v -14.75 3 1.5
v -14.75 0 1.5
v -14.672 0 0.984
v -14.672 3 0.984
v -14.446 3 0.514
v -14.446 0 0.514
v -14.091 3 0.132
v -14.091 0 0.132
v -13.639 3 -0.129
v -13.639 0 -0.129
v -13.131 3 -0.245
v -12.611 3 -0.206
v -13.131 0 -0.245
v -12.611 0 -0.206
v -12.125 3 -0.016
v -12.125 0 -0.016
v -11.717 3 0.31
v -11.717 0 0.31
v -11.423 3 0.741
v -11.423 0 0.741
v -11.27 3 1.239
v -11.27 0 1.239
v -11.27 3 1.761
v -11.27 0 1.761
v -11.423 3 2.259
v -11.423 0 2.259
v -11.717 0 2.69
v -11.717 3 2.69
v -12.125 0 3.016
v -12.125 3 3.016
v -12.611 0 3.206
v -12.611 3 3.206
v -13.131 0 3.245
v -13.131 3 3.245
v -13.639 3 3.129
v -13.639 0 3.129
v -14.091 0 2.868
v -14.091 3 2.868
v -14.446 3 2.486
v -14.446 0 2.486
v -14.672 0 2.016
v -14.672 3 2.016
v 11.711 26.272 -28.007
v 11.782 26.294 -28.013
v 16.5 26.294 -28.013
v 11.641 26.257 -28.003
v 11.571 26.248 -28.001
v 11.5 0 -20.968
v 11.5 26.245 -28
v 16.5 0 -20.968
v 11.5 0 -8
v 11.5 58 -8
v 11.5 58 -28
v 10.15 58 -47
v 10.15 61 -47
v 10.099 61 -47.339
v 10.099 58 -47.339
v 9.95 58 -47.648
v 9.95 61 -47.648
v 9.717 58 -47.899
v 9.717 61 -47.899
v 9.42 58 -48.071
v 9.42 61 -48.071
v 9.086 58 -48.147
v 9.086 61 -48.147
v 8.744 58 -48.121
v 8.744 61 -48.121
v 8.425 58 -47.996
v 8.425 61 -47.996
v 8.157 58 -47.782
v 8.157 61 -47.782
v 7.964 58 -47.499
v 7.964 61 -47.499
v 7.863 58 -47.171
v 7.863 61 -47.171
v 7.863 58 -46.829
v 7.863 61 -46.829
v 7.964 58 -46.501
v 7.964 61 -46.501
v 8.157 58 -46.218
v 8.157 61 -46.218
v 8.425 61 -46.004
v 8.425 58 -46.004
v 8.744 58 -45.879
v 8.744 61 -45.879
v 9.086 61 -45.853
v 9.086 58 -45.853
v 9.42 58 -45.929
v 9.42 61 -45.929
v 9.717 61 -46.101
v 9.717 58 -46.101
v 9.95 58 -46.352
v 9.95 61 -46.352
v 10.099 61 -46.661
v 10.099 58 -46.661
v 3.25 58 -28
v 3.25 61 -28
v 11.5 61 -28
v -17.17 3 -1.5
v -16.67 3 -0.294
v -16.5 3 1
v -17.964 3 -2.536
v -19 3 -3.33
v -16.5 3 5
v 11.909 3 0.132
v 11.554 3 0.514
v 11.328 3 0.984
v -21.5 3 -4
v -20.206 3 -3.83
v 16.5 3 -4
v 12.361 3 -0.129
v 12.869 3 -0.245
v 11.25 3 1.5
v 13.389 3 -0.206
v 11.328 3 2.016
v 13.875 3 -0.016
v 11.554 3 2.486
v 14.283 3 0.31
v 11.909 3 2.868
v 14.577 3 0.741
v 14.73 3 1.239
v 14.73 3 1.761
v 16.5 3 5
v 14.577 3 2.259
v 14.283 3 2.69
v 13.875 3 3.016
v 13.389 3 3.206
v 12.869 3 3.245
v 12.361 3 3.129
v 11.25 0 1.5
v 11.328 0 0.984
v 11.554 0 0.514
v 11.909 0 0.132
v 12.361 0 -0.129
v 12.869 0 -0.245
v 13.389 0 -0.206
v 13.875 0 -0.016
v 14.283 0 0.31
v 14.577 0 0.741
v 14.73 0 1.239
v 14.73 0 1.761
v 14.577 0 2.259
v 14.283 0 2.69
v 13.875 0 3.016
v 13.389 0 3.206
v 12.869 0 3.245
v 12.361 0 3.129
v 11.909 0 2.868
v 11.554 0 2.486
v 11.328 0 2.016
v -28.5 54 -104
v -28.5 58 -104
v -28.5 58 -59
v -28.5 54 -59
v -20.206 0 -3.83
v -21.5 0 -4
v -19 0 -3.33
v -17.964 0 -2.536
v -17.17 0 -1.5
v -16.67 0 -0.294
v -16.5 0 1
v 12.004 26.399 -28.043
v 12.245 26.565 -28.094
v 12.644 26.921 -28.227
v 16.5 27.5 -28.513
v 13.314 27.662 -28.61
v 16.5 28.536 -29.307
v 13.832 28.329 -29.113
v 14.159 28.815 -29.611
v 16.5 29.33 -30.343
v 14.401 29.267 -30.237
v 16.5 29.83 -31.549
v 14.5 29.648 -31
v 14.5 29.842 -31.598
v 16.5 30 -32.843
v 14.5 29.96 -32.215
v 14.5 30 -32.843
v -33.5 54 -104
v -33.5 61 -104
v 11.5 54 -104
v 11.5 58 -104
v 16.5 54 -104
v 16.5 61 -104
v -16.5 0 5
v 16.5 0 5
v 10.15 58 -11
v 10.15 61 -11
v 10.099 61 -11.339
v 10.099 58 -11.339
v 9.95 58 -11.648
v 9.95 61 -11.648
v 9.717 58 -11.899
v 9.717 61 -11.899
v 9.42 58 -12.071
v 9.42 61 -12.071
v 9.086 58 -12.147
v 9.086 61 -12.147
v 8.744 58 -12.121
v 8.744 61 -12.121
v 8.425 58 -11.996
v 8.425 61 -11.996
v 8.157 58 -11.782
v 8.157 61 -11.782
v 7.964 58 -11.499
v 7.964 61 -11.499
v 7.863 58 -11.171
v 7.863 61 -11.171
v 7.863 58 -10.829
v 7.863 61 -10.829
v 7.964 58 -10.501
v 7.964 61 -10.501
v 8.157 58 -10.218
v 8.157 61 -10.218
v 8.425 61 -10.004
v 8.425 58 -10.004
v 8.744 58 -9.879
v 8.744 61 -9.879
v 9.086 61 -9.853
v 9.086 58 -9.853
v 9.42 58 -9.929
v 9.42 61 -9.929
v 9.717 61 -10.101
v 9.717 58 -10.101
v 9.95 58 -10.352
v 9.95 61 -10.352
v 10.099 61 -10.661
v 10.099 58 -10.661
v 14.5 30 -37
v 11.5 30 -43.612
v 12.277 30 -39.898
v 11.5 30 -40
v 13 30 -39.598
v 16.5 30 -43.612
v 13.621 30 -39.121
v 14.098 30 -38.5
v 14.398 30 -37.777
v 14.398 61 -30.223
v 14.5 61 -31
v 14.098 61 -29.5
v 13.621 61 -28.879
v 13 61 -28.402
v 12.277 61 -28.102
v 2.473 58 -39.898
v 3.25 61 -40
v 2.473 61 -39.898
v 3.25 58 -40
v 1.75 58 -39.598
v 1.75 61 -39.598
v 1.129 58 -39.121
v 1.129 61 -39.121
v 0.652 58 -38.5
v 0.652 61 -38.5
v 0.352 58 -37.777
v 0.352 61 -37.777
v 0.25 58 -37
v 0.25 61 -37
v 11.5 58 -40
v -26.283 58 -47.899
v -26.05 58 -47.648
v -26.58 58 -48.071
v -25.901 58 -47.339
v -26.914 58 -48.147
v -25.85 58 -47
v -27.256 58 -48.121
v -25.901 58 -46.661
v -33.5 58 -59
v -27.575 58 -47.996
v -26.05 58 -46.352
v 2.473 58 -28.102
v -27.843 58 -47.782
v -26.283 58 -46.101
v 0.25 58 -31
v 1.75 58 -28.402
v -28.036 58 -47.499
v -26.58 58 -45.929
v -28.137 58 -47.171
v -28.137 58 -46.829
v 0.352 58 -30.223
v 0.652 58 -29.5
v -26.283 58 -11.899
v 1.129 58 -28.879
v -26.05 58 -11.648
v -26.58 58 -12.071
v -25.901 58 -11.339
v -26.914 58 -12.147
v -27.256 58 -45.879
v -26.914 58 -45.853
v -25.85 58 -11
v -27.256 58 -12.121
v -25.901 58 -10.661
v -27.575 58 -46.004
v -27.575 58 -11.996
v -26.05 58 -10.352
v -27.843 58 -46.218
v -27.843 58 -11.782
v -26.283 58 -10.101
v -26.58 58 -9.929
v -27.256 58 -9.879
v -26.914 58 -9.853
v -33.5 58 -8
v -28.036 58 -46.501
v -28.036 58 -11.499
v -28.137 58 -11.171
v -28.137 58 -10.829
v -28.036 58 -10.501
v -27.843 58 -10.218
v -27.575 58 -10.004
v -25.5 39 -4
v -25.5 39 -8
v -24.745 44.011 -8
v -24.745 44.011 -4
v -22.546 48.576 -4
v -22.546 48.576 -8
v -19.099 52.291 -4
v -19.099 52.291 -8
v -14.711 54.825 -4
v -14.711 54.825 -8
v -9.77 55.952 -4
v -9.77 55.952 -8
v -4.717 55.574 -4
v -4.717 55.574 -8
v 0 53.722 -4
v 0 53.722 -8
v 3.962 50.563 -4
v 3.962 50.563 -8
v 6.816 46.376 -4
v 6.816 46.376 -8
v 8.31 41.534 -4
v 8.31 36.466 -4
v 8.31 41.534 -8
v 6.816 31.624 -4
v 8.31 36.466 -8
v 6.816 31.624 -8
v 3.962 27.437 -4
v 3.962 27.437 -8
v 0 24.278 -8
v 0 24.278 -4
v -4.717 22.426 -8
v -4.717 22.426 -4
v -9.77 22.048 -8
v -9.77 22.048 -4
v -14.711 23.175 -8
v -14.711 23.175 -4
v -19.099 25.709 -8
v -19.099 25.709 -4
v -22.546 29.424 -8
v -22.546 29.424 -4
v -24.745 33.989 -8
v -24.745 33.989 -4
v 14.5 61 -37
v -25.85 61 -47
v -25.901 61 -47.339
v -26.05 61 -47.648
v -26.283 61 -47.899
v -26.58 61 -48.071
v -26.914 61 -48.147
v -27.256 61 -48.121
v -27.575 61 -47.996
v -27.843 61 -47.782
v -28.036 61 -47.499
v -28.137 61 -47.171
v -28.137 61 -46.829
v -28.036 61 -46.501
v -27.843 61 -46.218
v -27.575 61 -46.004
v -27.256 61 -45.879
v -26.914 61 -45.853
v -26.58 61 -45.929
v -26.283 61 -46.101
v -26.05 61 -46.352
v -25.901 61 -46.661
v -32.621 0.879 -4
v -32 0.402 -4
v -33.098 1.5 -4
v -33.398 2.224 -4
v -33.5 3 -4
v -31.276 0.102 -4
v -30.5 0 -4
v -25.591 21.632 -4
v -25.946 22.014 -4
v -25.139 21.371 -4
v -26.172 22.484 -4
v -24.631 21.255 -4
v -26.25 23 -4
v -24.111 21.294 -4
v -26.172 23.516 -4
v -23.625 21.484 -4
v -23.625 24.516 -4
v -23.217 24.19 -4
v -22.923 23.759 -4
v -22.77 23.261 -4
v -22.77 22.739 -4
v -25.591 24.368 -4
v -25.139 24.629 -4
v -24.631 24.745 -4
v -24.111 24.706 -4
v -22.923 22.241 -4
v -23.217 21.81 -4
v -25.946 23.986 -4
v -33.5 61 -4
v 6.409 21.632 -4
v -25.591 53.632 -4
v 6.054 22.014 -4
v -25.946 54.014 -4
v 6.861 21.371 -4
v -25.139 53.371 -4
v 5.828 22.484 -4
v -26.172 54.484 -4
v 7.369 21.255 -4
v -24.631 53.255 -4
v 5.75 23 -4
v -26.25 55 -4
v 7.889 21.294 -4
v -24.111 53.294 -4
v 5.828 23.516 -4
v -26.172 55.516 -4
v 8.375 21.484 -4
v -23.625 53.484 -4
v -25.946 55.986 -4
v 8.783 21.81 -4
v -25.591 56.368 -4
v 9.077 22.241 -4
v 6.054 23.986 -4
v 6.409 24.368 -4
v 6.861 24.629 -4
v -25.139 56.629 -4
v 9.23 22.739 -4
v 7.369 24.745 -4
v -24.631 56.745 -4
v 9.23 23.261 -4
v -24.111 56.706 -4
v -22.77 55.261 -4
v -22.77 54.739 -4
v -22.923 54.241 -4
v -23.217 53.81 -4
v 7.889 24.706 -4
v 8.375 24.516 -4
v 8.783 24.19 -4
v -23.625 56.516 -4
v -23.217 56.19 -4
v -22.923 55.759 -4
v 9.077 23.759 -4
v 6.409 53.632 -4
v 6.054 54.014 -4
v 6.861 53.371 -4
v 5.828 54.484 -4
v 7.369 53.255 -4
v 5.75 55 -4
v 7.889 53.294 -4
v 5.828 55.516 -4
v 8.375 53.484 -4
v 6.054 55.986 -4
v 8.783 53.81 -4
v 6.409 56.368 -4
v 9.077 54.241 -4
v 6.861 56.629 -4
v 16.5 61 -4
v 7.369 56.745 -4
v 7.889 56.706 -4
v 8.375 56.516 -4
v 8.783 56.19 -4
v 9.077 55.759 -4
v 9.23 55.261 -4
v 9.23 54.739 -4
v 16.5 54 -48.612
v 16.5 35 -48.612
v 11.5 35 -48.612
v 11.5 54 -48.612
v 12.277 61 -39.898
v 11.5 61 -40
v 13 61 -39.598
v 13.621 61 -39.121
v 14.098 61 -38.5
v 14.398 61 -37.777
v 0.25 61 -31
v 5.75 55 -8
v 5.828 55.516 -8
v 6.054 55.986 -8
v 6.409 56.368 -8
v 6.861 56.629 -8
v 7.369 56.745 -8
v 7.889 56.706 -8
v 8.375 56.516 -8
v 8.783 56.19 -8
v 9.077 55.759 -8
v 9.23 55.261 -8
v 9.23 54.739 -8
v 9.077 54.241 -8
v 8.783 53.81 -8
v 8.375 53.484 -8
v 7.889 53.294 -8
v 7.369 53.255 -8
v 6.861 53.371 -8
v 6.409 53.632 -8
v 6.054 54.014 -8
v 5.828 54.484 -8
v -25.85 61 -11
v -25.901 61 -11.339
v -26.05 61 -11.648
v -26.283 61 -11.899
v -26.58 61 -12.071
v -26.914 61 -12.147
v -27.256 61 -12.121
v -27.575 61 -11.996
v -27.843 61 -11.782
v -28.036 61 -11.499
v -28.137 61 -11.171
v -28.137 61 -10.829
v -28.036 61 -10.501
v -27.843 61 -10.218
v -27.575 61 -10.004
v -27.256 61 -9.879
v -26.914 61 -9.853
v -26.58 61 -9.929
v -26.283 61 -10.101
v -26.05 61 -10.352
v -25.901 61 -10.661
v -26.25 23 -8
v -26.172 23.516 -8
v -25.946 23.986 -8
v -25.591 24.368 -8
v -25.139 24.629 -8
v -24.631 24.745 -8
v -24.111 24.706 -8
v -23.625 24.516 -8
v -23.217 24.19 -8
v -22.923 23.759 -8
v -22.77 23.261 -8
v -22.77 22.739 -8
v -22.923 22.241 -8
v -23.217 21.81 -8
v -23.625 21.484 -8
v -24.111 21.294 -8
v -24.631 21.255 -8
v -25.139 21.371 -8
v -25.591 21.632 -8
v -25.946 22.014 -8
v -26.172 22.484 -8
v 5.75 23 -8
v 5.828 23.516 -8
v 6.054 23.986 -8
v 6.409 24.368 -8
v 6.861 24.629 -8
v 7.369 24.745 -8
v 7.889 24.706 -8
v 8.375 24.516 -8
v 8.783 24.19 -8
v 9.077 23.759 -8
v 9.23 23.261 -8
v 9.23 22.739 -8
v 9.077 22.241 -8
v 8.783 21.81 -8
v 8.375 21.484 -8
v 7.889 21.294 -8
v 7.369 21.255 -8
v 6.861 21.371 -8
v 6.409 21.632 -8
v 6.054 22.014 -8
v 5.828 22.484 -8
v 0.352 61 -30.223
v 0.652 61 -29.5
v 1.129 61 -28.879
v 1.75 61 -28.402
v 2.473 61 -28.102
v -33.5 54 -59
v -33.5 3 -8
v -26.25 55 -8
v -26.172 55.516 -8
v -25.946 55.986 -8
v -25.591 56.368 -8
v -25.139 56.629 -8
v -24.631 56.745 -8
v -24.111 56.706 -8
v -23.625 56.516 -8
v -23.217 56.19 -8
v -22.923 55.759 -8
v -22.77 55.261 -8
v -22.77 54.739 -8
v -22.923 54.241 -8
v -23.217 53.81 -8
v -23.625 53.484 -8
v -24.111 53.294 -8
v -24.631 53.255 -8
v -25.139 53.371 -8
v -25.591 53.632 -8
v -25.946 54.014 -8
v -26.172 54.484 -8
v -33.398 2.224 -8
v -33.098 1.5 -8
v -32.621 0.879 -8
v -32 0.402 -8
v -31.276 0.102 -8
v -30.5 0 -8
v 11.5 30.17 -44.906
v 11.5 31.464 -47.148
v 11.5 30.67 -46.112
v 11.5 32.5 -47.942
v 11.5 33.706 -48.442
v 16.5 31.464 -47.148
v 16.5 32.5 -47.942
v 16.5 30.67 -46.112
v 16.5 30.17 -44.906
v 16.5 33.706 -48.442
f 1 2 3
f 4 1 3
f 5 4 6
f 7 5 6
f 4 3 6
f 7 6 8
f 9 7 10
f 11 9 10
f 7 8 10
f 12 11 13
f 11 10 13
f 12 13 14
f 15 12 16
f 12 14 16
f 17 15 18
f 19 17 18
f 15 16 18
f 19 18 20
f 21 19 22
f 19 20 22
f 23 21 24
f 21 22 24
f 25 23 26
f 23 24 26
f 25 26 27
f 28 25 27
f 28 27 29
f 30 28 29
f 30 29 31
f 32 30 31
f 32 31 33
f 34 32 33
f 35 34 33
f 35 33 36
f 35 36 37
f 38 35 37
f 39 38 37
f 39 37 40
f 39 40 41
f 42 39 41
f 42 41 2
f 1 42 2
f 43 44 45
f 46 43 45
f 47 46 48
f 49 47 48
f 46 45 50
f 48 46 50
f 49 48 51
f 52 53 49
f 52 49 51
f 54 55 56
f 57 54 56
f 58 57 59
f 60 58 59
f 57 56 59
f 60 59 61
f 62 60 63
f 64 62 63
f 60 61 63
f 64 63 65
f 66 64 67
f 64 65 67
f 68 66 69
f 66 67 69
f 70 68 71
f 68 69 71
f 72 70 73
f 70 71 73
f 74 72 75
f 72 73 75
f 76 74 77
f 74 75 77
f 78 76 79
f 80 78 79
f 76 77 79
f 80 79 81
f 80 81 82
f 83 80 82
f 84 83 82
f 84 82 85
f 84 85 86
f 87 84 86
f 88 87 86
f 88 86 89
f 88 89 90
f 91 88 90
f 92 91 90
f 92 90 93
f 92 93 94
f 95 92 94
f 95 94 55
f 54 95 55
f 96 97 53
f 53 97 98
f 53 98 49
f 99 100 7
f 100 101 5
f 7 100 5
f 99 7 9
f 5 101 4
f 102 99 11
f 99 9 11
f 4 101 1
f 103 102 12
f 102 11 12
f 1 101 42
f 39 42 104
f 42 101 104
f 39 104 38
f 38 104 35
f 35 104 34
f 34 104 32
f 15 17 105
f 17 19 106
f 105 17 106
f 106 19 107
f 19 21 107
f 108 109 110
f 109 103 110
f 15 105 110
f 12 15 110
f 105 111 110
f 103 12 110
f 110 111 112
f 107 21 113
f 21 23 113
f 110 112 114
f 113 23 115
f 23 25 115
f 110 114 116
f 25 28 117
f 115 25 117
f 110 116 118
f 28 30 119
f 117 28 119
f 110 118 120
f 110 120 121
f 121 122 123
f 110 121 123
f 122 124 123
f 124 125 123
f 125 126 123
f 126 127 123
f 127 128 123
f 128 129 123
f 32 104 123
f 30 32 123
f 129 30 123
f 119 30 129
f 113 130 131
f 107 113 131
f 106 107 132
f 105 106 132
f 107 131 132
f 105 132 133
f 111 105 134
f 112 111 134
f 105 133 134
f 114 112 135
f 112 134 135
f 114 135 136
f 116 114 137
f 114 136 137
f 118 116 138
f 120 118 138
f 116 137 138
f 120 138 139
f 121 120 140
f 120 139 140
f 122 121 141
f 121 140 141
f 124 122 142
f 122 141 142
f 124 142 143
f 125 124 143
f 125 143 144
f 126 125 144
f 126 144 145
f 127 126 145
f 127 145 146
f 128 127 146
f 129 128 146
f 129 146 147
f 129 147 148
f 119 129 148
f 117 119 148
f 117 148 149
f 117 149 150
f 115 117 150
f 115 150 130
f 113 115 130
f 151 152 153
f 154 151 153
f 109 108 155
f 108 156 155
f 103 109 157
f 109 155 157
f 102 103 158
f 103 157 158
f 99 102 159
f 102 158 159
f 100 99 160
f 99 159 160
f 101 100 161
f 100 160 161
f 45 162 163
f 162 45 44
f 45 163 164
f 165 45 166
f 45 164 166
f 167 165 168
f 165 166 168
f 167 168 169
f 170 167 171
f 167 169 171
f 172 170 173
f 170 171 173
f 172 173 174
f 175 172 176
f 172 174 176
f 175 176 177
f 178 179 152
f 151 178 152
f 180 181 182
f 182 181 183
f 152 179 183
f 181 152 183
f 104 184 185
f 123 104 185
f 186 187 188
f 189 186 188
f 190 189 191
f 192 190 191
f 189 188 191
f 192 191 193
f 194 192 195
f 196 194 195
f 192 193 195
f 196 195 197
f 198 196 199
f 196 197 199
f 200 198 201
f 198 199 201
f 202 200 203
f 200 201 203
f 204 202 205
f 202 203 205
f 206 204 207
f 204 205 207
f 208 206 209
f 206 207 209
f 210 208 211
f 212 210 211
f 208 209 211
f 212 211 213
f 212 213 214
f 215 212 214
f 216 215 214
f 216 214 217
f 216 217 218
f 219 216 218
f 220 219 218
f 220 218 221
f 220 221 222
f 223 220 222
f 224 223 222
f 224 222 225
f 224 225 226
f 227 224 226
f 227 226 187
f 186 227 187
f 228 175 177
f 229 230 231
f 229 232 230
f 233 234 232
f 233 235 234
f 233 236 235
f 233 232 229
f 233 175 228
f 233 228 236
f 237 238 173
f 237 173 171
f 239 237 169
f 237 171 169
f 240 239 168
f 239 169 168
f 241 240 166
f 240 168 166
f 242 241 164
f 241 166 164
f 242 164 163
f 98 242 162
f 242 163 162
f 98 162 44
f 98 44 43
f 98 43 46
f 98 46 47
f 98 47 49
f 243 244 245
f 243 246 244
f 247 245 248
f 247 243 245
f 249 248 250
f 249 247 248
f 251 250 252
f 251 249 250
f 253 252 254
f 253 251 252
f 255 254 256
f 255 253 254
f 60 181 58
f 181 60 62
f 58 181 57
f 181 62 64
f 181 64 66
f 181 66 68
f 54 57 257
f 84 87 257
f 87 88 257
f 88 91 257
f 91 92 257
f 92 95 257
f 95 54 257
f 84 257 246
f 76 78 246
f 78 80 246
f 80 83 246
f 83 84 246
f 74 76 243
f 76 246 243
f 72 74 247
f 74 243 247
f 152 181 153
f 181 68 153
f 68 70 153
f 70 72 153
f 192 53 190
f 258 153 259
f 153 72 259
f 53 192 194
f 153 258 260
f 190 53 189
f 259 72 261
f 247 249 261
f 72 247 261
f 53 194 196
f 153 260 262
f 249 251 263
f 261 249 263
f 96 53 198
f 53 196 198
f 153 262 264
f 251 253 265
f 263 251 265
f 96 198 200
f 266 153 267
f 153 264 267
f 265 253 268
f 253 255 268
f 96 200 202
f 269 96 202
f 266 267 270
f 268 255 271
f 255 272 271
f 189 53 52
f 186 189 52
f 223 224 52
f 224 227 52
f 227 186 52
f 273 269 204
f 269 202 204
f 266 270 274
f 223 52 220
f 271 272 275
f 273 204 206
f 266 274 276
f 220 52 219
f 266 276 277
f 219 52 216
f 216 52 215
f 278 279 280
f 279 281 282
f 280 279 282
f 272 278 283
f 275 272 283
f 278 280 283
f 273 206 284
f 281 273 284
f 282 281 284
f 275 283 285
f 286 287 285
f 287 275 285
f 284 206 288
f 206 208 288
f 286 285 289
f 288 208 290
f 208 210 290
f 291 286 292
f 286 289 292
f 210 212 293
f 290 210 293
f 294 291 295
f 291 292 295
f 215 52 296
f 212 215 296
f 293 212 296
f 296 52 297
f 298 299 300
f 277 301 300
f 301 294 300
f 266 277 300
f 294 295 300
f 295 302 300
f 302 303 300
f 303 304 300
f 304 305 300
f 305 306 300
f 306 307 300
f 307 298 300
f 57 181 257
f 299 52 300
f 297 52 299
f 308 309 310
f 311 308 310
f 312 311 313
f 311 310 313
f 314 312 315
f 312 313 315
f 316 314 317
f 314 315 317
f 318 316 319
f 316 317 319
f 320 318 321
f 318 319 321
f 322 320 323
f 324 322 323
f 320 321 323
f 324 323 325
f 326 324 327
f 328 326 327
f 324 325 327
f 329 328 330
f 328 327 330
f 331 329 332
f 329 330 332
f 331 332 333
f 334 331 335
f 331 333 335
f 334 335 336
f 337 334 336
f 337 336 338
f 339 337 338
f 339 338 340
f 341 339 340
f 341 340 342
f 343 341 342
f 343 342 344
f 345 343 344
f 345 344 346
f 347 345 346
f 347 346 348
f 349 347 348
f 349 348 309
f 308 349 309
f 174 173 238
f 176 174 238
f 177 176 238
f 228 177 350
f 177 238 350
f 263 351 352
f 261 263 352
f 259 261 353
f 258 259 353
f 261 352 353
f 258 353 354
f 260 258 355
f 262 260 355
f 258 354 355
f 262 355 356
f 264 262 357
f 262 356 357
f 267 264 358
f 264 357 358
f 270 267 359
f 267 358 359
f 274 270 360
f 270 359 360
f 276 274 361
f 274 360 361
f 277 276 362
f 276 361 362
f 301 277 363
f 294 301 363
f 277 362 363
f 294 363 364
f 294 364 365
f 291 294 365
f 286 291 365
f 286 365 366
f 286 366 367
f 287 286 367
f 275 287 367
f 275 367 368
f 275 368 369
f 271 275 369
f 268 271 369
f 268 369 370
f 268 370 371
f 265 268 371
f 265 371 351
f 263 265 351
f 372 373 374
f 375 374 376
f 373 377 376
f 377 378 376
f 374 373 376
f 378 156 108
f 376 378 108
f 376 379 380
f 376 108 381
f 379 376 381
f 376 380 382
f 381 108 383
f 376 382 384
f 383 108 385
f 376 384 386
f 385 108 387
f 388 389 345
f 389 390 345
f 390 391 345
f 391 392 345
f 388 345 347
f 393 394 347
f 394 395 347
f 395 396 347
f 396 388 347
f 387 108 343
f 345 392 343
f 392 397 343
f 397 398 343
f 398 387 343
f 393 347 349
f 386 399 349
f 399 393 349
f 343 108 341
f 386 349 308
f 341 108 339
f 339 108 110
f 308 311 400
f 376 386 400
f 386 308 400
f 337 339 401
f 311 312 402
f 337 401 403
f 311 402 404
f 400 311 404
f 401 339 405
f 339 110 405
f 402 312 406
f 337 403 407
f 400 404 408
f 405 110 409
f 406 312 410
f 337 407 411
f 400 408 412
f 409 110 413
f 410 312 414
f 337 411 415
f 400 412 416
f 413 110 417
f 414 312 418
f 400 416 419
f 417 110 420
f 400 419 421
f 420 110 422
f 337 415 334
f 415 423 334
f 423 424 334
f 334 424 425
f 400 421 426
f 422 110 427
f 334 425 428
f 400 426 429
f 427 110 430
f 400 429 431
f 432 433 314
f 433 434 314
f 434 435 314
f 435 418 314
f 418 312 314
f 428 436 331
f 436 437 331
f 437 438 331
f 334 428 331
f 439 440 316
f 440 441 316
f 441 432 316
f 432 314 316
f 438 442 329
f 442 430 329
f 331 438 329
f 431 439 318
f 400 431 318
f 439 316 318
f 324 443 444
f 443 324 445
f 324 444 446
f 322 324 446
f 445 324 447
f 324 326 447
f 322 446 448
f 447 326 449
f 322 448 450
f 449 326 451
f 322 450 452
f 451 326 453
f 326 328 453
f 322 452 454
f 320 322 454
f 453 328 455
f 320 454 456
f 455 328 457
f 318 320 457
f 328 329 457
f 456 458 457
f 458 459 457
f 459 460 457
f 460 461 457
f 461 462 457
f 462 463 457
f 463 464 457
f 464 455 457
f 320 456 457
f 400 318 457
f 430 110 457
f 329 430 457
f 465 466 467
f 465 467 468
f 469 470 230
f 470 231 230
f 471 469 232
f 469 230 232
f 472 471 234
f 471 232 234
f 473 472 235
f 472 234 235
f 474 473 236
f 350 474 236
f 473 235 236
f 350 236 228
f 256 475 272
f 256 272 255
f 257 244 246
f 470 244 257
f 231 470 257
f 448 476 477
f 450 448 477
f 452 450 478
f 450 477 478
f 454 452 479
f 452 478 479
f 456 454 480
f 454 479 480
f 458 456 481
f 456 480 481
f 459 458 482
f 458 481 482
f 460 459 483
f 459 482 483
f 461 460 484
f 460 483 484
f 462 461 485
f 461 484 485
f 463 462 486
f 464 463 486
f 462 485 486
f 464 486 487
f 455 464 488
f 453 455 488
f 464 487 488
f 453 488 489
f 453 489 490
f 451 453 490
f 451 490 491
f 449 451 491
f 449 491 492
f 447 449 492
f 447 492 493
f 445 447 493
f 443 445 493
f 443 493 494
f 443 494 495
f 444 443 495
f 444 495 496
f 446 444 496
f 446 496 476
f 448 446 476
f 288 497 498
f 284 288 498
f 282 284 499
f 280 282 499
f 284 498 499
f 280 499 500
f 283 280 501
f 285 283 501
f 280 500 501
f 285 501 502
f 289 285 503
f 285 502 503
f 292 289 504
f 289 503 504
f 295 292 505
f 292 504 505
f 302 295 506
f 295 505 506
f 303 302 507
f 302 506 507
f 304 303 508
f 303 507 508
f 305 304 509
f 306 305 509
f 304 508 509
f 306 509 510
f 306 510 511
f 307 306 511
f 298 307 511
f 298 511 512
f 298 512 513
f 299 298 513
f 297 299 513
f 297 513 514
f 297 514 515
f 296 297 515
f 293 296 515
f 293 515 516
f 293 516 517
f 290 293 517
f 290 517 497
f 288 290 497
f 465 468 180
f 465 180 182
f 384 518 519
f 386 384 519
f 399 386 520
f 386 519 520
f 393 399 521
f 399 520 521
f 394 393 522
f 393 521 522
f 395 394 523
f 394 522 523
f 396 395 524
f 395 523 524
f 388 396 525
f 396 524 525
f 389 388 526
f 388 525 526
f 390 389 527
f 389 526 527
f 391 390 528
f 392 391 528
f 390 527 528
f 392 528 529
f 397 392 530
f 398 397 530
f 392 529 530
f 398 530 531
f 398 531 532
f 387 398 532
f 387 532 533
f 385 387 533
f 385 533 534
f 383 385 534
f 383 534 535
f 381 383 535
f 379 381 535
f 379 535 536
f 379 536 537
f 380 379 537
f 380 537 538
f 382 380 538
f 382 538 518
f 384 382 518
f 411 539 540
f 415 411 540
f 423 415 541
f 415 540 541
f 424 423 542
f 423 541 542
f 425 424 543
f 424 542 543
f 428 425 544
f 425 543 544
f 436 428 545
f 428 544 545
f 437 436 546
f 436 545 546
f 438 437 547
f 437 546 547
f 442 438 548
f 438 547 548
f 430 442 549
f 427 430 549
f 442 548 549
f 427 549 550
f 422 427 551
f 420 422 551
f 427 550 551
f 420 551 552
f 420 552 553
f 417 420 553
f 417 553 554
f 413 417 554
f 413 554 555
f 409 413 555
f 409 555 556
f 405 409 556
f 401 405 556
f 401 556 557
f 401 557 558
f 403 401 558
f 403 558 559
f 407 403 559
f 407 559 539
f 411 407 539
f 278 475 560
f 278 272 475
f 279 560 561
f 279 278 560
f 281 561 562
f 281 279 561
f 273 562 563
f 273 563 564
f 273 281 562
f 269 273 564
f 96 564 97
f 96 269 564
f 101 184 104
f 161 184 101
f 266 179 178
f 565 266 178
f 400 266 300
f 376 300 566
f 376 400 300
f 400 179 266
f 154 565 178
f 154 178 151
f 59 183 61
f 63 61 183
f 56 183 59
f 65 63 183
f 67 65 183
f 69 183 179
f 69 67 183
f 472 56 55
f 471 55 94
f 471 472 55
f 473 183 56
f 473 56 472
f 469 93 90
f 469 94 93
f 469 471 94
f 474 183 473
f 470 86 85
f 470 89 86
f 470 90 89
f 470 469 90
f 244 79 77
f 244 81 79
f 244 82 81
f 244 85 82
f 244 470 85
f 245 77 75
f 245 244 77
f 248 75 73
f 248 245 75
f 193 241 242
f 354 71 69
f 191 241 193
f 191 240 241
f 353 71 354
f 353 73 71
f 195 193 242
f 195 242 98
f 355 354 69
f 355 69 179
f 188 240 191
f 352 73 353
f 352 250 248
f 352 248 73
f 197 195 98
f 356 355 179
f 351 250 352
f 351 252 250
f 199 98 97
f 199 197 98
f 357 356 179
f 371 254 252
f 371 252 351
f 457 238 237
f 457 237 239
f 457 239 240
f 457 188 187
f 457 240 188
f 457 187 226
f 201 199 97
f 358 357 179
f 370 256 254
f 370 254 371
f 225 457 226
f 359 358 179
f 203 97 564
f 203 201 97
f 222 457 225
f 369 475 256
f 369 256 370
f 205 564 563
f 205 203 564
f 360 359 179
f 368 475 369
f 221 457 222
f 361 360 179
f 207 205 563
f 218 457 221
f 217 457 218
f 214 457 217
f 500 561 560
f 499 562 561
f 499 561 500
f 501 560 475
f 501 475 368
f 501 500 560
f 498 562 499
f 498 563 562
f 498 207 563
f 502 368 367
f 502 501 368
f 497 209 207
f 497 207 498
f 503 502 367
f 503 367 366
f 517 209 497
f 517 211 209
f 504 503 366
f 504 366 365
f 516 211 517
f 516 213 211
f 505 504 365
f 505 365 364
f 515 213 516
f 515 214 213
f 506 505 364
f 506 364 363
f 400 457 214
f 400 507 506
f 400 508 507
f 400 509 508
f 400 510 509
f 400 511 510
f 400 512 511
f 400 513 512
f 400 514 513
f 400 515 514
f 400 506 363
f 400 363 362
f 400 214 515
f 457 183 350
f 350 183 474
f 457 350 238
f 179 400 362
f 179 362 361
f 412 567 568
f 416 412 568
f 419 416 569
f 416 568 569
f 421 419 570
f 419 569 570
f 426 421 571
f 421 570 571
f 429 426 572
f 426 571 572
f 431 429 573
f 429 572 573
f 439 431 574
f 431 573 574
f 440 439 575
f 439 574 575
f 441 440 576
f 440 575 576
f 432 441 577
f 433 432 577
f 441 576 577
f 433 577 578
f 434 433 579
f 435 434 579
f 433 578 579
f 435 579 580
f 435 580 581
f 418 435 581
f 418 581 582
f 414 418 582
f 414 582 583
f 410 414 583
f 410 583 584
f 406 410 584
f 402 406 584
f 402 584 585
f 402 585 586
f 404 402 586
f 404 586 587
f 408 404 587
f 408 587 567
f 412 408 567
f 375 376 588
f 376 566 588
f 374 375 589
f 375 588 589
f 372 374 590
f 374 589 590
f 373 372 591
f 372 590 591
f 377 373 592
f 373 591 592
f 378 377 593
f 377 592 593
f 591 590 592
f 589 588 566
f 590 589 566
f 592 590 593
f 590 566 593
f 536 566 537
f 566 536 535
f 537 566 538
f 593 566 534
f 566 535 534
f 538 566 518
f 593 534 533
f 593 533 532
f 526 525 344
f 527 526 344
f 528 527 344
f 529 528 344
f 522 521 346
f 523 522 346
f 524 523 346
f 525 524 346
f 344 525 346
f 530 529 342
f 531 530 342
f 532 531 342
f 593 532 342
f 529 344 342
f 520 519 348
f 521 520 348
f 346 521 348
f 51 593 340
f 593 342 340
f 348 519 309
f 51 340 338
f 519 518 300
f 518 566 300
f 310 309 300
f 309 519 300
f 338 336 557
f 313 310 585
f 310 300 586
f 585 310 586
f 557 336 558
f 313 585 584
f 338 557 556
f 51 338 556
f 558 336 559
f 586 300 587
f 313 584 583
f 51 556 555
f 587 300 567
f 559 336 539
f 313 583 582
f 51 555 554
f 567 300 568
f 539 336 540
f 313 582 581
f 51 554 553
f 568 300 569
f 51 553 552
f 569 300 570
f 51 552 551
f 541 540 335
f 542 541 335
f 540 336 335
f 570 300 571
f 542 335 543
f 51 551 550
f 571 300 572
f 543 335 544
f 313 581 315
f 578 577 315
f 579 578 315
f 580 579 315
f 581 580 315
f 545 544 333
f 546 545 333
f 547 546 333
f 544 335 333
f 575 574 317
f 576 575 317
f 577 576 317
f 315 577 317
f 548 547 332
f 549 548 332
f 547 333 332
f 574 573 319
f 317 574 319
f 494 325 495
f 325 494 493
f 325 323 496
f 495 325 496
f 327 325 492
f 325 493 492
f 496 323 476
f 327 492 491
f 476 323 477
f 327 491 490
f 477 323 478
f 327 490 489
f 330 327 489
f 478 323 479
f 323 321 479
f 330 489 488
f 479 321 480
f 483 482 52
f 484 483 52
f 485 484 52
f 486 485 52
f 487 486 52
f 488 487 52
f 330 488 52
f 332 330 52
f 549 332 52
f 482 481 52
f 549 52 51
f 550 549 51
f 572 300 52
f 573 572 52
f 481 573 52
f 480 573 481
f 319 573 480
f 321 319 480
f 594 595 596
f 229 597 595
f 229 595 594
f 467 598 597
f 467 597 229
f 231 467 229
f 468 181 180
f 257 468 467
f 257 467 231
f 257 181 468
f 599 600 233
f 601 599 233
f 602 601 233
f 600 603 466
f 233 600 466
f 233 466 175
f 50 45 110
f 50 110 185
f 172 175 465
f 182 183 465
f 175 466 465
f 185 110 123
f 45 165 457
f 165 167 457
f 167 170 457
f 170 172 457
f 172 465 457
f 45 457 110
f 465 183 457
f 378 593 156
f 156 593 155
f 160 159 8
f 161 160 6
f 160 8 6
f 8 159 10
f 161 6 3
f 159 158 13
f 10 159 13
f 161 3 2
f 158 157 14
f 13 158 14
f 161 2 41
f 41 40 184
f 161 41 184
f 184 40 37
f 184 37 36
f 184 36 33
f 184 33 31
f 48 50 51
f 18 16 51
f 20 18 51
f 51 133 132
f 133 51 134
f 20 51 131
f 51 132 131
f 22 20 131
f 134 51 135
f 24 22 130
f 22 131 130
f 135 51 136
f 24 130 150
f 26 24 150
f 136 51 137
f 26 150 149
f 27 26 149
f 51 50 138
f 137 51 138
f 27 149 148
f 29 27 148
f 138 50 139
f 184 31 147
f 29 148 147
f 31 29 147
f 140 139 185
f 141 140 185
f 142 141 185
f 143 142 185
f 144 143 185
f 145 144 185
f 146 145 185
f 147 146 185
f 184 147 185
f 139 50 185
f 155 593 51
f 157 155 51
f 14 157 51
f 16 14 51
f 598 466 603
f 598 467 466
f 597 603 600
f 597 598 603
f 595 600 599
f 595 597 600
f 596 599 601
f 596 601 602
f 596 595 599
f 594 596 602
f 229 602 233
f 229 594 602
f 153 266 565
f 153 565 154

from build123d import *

# Parameters (mm, degrees)
SKETCH_1_W          = 33
SKETCH_1_H          = 10
EXTRUDE_1_DEPTH     = 3
HOLE_WIZARD_1_D     = 3.5
SKETCH_5_W          = 33
SKETCH_5_H          = 3
EXTRUDE_2_DEPTH     = 3
SKETCH_6_W          = 33
SKETCH_6_H          = 4
EXTRUDE_3_DEPTH     = 55
SKETCH_7_W          = 50
SKETCH_7_H          = 4
EXTRUDE_4_DEPTH     = 3
SKETCH_8_W          = 50
SKETCH_8_H          = 3
EXTRUDE_5_DEPTH     = 56
EXTRUDE_6_DEPTH     = 5
EXTRUDE_7_DEPTH     = 4
SKETCH_20_W         = 50
SKETCH_20_H         = 3
EXTRUDE_9_DEPTH     = 40
EXTRUDE_15_DEPTH    = 4
EXTRUDE_16_DEPTH    = 4
FILLET_1_R          = 3
HOLE_WIZARD_5_D     = 3.5
HOLE_WIZARD_6_D     = 34
HOLE_WIZARD_7_D     = 2.3
EXTRUDE_17_DEPTH    = 5
SKETCH_49_W         = 44.612037216
SKETCH_49_H         = 28
EXTRUDE_18_DEPTH    = 5
SKETCH_50_W         = 11.25
SKETCH_50_H         = 12
CUT_EXTRUDE_1_DEPTH = 10
EXTRUDE_19_DEPTH    = 5
FILLET_2_R          = 5
SKETCH_52_W         = 3
SKETCH_52_H         = 12
CUT_EXTRUDE_2_DEPTH = 126.136925006
FILLET_3_R          = 3
FILLET_4_R          = 5
SKETCH_53_W         = 5
SKETCH_53_H         = 55.387962784
SKETCH_53_H_2       = 45
EXTRUDE_20_DEPTH    = 4


with BuildPart() as part:
    # 草图1 → 凸台-拉伸1 (new body)
    with BuildSketch(Plane(origin=(0, 0, 0), x_dir=(1, 0, 0), z_dir=(0, 1, 0))):
        Rectangle(SKETCH_1_W, SKETCH_1_H)
    extrude(amount=EXTRUDE_1_DEPTH)

    # 孔1 (through all)
    with Locations(Plane(origin=(0, 3, 0), x_dir=(1, 0, 0), z_dir=(0, 1, 0))):
        with Locations((-13, -1.5), (13, -1.5)):
            Hole(HOLE_WIZARD_1_D / 2)

    # 草图5 → 凸台-拉伸2 (add)
    with BuildSketch(Plane.XZ):
        with Locations((0, -6.5)):
            Rectangle(SKETCH_5_W, SKETCH_5_H)
    extrude(amount=-EXTRUDE_2_DEPTH)

    # 草图6 → 凸台-拉伸3 (add)
    with BuildSketch(Plane(origin=(0, 3, 0), x_dir=(1, 0, 0), z_dir=(0, 1, 0))):
        with Locations((0, 6)):
            Rectangle(SKETCH_6_W, SKETCH_6_H)
    extrude(amount=EXTRUDE_3_DEPTH)

    # 草图7 → 凸台-拉伸4 (add)
    with BuildSketch(Plane(origin=(0, 58, 0), x_dir=(1, 0, 0), z_dir=(0, 1, 0))):
        with Locations((-8.5, 6)):
            Rectangle(SKETCH_7_W, SKETCH_7_H)
    extrude(amount=EXTRUDE_4_DEPTH)

    # 草图8 → 凸台-拉伸5 (add)
    with BuildSketch(Plane(origin=(0, 0, -8), x_dir=(-1, 0, 0), z_dir=(0, 0, -1))):
        with Locations((8.5, 59.5)):
            Rectangle(SKETCH_8_W, SKETCH_8_H)
    extrude(amount=EXTRUDE_5_DEPTH)

    # 草图15 → 凸台-拉伸6 (add)
    with BuildSketch(Plane(origin=(16.5, 0, 0), x_dir=(0, 0, -1), z_dir=(1, 0, 0))):
        Polygon((8, 0), (48.612037216, 58), (42.508164272, 58), (8, 8.717233978), align=None)
    extrude(amount=-EXTRUDE_6_DEPTH)

    # 草图16 → 凸台-拉伸7 (add)
    with BuildSketch(Plane.XY.offset(-4)):
        Polygon((-16.5, 0), (-33.5, 58), (-28.289650608, 58), (-16.5, 17.77648616), align=None)
    extrude(amount=-EXTRUDE_7_DEPTH)

    # 草图20 → 凸台-拉伸9 (add)
    with BuildSketch(Plane(origin=(0, 0, -64), x_dir=(-1, 0, 0), z_dir=(0, 0, -1))):
        with Locations((8.5, 59.5)):
            Rectangle(SKETCH_20_W, SKETCH_20_H)
    extrude(amount=EXTRUDE_9_DEPTH)

    # 草图33 → 凸台-拉伸15 (add)
    with BuildSketch(Plane.XY.offset(-4)):
        Polygon((-28.289650608, 58), (-16.5, 17.77648616), (-16.5, 58), align=None)
    extrude(amount=-EXTRUDE_15_DEPTH)

    # 草图34 → 凸台-拉伸16 (add)
    with BuildSketch(Plane.XY.offset(-4)):
        Polygon((-33.5, 58), (-33.5, 0), (-16.5, 0), align=None)
    extrude(amount=-EXTRUDE_16_DEPTH)

    # 圆角1
    fillet_1_edges = [part.edges().sort_by_distance(p)[0] for p in [
        (-33.5, 0, -6),
    ]]
    fillet(fillet_1_edges, radius=FILLET_1_R)

    # 孔5 (through all)
    with Locations(Plane.XY.offset(-4)):
        with Locations((-24.5, 55), (-24.5, 23), (7.5, 23), (7.5, 55)):
            Hole(HOLE_WIZARD_5_D / 2)

    # 孔6 (through all)
    with Locations(Plane.XY.offset(-4)):
        with Locations((-8.5, 39)):
            Hole(HOLE_WIZARD_6_D / 2)

    # 孔7 (through all)
    with Locations(Plane(origin=(0, 58, 0), x_dir=(-1, 0, 0), z_dir=(0, -1, 0))):
        with Locations((-9, 11), (-9, 47), (27, 47), (27, 11)):
            Hole(HOLE_WIZARD_7_D / 2)

    # 草图48 → 凸台-拉伸17 (add)
    with BuildSketch(Plane(origin=(16.5, 0, 0), x_dir=(0, 0, -1), z_dir=(1, 0, 0))):
        Polygon((8, 8.717233978), (8, 58), (42.508164272, 58), align=None)
    extrude(amount=-EXTRUDE_17_DEPTH)

    # 草图49 → 凸台-拉伸18 (add)
    with BuildSketch(Plane(origin=(16.5, 0, 0), x_dir=(0, 0, -1), z_dir=(1, 0, 0))):
        with Locations((26.306018608, 44)):
            Rectangle(SKETCH_49_W, SKETCH_49_H)
    extrude(amount=-EXTRUDE_18_DEPTH)

    # 草图50 → 切除-拉伸1 (cut)
    with BuildSketch(Plane(origin=(0, 61, 0), x_dir=(1, 0, 0), z_dir=(0, 1, 0))):
        with Locations((5.875, 34)):
            Rectangle(SKETCH_50_W, SKETCH_50_H)
    extrude(amount=-CUT_EXTRUDE_1_DEPTH, mode=Mode.SUBTRACT)

    # 草图51 → 凸台-拉伸19 (add)
    with BuildSketch(Plane(origin=(16.5, 0, 0), x_dir=(0, 0, -1), z_dir=(1, 0, 0))):
        Polygon((29.006226146, 30), (20.967750373, 0), (8, 0), align=None)
    extrude(amount=-EXTRUDE_19_DEPTH)

    # 圆角2
    fillet_2_edges = [part.edges().sort_by_distance(p)[0] for p in [
        (14, 30, -29.006226146),
        (14, 30, -48.612037216),
    ]]
    fillet(fillet_2_edges, radius=FILLET_2_R)

    # 草图52 → 切除-拉伸2 (cut, through all)
    with BuildSketch(Plane(origin=(0, 61, 0), x_dir=(1, 0, 0), z_dir=(0, 1, 0))):
        with Locations((13, 34)):
            Rectangle(SKETCH_52_W, SKETCH_52_H)
    extrude(amount=-CUT_EXTRUDE_2_DEPTH, mode=Mode.SUBTRACT)

    # 圆角3
    fillet_3_edges = [part.edges().sort_by_distance(p)[0] for p in [
        (0.25, 59.5, -28),
        (0.25, 59.5, -40),
        (14.5, 45.5, -40),
        (14.5, 43.622356449, -28),
    ]]
    fillet(fillet_3_edges, radius=FILLET_3_R - 0.0001)  # a hair under: the kernel refuses the full size

    # 圆角4
    fillet_4_edges = [part.edges().sort_by_distance(p)[0] for p in [
        (-16.5, 1.5, -4),
    ]]
    fillet(fillet_4_edges, radius=FILLET_4_R)

    # 草图53 → 凸台-拉伸20 (add)
    with BuildSketch(Plane.XZ.offset(-58)):
        with Locations((14, -76.306018608)):
            Rectangle(SKETCH_53_W, SKETCH_53_H)
        with Locations((-31, -81.5)):
            Rectangle(SKETCH_53_W, SKETCH_53_H_2)
    extrude(amount=EXTRUDE_20_DEPTH)


solid = part.part
